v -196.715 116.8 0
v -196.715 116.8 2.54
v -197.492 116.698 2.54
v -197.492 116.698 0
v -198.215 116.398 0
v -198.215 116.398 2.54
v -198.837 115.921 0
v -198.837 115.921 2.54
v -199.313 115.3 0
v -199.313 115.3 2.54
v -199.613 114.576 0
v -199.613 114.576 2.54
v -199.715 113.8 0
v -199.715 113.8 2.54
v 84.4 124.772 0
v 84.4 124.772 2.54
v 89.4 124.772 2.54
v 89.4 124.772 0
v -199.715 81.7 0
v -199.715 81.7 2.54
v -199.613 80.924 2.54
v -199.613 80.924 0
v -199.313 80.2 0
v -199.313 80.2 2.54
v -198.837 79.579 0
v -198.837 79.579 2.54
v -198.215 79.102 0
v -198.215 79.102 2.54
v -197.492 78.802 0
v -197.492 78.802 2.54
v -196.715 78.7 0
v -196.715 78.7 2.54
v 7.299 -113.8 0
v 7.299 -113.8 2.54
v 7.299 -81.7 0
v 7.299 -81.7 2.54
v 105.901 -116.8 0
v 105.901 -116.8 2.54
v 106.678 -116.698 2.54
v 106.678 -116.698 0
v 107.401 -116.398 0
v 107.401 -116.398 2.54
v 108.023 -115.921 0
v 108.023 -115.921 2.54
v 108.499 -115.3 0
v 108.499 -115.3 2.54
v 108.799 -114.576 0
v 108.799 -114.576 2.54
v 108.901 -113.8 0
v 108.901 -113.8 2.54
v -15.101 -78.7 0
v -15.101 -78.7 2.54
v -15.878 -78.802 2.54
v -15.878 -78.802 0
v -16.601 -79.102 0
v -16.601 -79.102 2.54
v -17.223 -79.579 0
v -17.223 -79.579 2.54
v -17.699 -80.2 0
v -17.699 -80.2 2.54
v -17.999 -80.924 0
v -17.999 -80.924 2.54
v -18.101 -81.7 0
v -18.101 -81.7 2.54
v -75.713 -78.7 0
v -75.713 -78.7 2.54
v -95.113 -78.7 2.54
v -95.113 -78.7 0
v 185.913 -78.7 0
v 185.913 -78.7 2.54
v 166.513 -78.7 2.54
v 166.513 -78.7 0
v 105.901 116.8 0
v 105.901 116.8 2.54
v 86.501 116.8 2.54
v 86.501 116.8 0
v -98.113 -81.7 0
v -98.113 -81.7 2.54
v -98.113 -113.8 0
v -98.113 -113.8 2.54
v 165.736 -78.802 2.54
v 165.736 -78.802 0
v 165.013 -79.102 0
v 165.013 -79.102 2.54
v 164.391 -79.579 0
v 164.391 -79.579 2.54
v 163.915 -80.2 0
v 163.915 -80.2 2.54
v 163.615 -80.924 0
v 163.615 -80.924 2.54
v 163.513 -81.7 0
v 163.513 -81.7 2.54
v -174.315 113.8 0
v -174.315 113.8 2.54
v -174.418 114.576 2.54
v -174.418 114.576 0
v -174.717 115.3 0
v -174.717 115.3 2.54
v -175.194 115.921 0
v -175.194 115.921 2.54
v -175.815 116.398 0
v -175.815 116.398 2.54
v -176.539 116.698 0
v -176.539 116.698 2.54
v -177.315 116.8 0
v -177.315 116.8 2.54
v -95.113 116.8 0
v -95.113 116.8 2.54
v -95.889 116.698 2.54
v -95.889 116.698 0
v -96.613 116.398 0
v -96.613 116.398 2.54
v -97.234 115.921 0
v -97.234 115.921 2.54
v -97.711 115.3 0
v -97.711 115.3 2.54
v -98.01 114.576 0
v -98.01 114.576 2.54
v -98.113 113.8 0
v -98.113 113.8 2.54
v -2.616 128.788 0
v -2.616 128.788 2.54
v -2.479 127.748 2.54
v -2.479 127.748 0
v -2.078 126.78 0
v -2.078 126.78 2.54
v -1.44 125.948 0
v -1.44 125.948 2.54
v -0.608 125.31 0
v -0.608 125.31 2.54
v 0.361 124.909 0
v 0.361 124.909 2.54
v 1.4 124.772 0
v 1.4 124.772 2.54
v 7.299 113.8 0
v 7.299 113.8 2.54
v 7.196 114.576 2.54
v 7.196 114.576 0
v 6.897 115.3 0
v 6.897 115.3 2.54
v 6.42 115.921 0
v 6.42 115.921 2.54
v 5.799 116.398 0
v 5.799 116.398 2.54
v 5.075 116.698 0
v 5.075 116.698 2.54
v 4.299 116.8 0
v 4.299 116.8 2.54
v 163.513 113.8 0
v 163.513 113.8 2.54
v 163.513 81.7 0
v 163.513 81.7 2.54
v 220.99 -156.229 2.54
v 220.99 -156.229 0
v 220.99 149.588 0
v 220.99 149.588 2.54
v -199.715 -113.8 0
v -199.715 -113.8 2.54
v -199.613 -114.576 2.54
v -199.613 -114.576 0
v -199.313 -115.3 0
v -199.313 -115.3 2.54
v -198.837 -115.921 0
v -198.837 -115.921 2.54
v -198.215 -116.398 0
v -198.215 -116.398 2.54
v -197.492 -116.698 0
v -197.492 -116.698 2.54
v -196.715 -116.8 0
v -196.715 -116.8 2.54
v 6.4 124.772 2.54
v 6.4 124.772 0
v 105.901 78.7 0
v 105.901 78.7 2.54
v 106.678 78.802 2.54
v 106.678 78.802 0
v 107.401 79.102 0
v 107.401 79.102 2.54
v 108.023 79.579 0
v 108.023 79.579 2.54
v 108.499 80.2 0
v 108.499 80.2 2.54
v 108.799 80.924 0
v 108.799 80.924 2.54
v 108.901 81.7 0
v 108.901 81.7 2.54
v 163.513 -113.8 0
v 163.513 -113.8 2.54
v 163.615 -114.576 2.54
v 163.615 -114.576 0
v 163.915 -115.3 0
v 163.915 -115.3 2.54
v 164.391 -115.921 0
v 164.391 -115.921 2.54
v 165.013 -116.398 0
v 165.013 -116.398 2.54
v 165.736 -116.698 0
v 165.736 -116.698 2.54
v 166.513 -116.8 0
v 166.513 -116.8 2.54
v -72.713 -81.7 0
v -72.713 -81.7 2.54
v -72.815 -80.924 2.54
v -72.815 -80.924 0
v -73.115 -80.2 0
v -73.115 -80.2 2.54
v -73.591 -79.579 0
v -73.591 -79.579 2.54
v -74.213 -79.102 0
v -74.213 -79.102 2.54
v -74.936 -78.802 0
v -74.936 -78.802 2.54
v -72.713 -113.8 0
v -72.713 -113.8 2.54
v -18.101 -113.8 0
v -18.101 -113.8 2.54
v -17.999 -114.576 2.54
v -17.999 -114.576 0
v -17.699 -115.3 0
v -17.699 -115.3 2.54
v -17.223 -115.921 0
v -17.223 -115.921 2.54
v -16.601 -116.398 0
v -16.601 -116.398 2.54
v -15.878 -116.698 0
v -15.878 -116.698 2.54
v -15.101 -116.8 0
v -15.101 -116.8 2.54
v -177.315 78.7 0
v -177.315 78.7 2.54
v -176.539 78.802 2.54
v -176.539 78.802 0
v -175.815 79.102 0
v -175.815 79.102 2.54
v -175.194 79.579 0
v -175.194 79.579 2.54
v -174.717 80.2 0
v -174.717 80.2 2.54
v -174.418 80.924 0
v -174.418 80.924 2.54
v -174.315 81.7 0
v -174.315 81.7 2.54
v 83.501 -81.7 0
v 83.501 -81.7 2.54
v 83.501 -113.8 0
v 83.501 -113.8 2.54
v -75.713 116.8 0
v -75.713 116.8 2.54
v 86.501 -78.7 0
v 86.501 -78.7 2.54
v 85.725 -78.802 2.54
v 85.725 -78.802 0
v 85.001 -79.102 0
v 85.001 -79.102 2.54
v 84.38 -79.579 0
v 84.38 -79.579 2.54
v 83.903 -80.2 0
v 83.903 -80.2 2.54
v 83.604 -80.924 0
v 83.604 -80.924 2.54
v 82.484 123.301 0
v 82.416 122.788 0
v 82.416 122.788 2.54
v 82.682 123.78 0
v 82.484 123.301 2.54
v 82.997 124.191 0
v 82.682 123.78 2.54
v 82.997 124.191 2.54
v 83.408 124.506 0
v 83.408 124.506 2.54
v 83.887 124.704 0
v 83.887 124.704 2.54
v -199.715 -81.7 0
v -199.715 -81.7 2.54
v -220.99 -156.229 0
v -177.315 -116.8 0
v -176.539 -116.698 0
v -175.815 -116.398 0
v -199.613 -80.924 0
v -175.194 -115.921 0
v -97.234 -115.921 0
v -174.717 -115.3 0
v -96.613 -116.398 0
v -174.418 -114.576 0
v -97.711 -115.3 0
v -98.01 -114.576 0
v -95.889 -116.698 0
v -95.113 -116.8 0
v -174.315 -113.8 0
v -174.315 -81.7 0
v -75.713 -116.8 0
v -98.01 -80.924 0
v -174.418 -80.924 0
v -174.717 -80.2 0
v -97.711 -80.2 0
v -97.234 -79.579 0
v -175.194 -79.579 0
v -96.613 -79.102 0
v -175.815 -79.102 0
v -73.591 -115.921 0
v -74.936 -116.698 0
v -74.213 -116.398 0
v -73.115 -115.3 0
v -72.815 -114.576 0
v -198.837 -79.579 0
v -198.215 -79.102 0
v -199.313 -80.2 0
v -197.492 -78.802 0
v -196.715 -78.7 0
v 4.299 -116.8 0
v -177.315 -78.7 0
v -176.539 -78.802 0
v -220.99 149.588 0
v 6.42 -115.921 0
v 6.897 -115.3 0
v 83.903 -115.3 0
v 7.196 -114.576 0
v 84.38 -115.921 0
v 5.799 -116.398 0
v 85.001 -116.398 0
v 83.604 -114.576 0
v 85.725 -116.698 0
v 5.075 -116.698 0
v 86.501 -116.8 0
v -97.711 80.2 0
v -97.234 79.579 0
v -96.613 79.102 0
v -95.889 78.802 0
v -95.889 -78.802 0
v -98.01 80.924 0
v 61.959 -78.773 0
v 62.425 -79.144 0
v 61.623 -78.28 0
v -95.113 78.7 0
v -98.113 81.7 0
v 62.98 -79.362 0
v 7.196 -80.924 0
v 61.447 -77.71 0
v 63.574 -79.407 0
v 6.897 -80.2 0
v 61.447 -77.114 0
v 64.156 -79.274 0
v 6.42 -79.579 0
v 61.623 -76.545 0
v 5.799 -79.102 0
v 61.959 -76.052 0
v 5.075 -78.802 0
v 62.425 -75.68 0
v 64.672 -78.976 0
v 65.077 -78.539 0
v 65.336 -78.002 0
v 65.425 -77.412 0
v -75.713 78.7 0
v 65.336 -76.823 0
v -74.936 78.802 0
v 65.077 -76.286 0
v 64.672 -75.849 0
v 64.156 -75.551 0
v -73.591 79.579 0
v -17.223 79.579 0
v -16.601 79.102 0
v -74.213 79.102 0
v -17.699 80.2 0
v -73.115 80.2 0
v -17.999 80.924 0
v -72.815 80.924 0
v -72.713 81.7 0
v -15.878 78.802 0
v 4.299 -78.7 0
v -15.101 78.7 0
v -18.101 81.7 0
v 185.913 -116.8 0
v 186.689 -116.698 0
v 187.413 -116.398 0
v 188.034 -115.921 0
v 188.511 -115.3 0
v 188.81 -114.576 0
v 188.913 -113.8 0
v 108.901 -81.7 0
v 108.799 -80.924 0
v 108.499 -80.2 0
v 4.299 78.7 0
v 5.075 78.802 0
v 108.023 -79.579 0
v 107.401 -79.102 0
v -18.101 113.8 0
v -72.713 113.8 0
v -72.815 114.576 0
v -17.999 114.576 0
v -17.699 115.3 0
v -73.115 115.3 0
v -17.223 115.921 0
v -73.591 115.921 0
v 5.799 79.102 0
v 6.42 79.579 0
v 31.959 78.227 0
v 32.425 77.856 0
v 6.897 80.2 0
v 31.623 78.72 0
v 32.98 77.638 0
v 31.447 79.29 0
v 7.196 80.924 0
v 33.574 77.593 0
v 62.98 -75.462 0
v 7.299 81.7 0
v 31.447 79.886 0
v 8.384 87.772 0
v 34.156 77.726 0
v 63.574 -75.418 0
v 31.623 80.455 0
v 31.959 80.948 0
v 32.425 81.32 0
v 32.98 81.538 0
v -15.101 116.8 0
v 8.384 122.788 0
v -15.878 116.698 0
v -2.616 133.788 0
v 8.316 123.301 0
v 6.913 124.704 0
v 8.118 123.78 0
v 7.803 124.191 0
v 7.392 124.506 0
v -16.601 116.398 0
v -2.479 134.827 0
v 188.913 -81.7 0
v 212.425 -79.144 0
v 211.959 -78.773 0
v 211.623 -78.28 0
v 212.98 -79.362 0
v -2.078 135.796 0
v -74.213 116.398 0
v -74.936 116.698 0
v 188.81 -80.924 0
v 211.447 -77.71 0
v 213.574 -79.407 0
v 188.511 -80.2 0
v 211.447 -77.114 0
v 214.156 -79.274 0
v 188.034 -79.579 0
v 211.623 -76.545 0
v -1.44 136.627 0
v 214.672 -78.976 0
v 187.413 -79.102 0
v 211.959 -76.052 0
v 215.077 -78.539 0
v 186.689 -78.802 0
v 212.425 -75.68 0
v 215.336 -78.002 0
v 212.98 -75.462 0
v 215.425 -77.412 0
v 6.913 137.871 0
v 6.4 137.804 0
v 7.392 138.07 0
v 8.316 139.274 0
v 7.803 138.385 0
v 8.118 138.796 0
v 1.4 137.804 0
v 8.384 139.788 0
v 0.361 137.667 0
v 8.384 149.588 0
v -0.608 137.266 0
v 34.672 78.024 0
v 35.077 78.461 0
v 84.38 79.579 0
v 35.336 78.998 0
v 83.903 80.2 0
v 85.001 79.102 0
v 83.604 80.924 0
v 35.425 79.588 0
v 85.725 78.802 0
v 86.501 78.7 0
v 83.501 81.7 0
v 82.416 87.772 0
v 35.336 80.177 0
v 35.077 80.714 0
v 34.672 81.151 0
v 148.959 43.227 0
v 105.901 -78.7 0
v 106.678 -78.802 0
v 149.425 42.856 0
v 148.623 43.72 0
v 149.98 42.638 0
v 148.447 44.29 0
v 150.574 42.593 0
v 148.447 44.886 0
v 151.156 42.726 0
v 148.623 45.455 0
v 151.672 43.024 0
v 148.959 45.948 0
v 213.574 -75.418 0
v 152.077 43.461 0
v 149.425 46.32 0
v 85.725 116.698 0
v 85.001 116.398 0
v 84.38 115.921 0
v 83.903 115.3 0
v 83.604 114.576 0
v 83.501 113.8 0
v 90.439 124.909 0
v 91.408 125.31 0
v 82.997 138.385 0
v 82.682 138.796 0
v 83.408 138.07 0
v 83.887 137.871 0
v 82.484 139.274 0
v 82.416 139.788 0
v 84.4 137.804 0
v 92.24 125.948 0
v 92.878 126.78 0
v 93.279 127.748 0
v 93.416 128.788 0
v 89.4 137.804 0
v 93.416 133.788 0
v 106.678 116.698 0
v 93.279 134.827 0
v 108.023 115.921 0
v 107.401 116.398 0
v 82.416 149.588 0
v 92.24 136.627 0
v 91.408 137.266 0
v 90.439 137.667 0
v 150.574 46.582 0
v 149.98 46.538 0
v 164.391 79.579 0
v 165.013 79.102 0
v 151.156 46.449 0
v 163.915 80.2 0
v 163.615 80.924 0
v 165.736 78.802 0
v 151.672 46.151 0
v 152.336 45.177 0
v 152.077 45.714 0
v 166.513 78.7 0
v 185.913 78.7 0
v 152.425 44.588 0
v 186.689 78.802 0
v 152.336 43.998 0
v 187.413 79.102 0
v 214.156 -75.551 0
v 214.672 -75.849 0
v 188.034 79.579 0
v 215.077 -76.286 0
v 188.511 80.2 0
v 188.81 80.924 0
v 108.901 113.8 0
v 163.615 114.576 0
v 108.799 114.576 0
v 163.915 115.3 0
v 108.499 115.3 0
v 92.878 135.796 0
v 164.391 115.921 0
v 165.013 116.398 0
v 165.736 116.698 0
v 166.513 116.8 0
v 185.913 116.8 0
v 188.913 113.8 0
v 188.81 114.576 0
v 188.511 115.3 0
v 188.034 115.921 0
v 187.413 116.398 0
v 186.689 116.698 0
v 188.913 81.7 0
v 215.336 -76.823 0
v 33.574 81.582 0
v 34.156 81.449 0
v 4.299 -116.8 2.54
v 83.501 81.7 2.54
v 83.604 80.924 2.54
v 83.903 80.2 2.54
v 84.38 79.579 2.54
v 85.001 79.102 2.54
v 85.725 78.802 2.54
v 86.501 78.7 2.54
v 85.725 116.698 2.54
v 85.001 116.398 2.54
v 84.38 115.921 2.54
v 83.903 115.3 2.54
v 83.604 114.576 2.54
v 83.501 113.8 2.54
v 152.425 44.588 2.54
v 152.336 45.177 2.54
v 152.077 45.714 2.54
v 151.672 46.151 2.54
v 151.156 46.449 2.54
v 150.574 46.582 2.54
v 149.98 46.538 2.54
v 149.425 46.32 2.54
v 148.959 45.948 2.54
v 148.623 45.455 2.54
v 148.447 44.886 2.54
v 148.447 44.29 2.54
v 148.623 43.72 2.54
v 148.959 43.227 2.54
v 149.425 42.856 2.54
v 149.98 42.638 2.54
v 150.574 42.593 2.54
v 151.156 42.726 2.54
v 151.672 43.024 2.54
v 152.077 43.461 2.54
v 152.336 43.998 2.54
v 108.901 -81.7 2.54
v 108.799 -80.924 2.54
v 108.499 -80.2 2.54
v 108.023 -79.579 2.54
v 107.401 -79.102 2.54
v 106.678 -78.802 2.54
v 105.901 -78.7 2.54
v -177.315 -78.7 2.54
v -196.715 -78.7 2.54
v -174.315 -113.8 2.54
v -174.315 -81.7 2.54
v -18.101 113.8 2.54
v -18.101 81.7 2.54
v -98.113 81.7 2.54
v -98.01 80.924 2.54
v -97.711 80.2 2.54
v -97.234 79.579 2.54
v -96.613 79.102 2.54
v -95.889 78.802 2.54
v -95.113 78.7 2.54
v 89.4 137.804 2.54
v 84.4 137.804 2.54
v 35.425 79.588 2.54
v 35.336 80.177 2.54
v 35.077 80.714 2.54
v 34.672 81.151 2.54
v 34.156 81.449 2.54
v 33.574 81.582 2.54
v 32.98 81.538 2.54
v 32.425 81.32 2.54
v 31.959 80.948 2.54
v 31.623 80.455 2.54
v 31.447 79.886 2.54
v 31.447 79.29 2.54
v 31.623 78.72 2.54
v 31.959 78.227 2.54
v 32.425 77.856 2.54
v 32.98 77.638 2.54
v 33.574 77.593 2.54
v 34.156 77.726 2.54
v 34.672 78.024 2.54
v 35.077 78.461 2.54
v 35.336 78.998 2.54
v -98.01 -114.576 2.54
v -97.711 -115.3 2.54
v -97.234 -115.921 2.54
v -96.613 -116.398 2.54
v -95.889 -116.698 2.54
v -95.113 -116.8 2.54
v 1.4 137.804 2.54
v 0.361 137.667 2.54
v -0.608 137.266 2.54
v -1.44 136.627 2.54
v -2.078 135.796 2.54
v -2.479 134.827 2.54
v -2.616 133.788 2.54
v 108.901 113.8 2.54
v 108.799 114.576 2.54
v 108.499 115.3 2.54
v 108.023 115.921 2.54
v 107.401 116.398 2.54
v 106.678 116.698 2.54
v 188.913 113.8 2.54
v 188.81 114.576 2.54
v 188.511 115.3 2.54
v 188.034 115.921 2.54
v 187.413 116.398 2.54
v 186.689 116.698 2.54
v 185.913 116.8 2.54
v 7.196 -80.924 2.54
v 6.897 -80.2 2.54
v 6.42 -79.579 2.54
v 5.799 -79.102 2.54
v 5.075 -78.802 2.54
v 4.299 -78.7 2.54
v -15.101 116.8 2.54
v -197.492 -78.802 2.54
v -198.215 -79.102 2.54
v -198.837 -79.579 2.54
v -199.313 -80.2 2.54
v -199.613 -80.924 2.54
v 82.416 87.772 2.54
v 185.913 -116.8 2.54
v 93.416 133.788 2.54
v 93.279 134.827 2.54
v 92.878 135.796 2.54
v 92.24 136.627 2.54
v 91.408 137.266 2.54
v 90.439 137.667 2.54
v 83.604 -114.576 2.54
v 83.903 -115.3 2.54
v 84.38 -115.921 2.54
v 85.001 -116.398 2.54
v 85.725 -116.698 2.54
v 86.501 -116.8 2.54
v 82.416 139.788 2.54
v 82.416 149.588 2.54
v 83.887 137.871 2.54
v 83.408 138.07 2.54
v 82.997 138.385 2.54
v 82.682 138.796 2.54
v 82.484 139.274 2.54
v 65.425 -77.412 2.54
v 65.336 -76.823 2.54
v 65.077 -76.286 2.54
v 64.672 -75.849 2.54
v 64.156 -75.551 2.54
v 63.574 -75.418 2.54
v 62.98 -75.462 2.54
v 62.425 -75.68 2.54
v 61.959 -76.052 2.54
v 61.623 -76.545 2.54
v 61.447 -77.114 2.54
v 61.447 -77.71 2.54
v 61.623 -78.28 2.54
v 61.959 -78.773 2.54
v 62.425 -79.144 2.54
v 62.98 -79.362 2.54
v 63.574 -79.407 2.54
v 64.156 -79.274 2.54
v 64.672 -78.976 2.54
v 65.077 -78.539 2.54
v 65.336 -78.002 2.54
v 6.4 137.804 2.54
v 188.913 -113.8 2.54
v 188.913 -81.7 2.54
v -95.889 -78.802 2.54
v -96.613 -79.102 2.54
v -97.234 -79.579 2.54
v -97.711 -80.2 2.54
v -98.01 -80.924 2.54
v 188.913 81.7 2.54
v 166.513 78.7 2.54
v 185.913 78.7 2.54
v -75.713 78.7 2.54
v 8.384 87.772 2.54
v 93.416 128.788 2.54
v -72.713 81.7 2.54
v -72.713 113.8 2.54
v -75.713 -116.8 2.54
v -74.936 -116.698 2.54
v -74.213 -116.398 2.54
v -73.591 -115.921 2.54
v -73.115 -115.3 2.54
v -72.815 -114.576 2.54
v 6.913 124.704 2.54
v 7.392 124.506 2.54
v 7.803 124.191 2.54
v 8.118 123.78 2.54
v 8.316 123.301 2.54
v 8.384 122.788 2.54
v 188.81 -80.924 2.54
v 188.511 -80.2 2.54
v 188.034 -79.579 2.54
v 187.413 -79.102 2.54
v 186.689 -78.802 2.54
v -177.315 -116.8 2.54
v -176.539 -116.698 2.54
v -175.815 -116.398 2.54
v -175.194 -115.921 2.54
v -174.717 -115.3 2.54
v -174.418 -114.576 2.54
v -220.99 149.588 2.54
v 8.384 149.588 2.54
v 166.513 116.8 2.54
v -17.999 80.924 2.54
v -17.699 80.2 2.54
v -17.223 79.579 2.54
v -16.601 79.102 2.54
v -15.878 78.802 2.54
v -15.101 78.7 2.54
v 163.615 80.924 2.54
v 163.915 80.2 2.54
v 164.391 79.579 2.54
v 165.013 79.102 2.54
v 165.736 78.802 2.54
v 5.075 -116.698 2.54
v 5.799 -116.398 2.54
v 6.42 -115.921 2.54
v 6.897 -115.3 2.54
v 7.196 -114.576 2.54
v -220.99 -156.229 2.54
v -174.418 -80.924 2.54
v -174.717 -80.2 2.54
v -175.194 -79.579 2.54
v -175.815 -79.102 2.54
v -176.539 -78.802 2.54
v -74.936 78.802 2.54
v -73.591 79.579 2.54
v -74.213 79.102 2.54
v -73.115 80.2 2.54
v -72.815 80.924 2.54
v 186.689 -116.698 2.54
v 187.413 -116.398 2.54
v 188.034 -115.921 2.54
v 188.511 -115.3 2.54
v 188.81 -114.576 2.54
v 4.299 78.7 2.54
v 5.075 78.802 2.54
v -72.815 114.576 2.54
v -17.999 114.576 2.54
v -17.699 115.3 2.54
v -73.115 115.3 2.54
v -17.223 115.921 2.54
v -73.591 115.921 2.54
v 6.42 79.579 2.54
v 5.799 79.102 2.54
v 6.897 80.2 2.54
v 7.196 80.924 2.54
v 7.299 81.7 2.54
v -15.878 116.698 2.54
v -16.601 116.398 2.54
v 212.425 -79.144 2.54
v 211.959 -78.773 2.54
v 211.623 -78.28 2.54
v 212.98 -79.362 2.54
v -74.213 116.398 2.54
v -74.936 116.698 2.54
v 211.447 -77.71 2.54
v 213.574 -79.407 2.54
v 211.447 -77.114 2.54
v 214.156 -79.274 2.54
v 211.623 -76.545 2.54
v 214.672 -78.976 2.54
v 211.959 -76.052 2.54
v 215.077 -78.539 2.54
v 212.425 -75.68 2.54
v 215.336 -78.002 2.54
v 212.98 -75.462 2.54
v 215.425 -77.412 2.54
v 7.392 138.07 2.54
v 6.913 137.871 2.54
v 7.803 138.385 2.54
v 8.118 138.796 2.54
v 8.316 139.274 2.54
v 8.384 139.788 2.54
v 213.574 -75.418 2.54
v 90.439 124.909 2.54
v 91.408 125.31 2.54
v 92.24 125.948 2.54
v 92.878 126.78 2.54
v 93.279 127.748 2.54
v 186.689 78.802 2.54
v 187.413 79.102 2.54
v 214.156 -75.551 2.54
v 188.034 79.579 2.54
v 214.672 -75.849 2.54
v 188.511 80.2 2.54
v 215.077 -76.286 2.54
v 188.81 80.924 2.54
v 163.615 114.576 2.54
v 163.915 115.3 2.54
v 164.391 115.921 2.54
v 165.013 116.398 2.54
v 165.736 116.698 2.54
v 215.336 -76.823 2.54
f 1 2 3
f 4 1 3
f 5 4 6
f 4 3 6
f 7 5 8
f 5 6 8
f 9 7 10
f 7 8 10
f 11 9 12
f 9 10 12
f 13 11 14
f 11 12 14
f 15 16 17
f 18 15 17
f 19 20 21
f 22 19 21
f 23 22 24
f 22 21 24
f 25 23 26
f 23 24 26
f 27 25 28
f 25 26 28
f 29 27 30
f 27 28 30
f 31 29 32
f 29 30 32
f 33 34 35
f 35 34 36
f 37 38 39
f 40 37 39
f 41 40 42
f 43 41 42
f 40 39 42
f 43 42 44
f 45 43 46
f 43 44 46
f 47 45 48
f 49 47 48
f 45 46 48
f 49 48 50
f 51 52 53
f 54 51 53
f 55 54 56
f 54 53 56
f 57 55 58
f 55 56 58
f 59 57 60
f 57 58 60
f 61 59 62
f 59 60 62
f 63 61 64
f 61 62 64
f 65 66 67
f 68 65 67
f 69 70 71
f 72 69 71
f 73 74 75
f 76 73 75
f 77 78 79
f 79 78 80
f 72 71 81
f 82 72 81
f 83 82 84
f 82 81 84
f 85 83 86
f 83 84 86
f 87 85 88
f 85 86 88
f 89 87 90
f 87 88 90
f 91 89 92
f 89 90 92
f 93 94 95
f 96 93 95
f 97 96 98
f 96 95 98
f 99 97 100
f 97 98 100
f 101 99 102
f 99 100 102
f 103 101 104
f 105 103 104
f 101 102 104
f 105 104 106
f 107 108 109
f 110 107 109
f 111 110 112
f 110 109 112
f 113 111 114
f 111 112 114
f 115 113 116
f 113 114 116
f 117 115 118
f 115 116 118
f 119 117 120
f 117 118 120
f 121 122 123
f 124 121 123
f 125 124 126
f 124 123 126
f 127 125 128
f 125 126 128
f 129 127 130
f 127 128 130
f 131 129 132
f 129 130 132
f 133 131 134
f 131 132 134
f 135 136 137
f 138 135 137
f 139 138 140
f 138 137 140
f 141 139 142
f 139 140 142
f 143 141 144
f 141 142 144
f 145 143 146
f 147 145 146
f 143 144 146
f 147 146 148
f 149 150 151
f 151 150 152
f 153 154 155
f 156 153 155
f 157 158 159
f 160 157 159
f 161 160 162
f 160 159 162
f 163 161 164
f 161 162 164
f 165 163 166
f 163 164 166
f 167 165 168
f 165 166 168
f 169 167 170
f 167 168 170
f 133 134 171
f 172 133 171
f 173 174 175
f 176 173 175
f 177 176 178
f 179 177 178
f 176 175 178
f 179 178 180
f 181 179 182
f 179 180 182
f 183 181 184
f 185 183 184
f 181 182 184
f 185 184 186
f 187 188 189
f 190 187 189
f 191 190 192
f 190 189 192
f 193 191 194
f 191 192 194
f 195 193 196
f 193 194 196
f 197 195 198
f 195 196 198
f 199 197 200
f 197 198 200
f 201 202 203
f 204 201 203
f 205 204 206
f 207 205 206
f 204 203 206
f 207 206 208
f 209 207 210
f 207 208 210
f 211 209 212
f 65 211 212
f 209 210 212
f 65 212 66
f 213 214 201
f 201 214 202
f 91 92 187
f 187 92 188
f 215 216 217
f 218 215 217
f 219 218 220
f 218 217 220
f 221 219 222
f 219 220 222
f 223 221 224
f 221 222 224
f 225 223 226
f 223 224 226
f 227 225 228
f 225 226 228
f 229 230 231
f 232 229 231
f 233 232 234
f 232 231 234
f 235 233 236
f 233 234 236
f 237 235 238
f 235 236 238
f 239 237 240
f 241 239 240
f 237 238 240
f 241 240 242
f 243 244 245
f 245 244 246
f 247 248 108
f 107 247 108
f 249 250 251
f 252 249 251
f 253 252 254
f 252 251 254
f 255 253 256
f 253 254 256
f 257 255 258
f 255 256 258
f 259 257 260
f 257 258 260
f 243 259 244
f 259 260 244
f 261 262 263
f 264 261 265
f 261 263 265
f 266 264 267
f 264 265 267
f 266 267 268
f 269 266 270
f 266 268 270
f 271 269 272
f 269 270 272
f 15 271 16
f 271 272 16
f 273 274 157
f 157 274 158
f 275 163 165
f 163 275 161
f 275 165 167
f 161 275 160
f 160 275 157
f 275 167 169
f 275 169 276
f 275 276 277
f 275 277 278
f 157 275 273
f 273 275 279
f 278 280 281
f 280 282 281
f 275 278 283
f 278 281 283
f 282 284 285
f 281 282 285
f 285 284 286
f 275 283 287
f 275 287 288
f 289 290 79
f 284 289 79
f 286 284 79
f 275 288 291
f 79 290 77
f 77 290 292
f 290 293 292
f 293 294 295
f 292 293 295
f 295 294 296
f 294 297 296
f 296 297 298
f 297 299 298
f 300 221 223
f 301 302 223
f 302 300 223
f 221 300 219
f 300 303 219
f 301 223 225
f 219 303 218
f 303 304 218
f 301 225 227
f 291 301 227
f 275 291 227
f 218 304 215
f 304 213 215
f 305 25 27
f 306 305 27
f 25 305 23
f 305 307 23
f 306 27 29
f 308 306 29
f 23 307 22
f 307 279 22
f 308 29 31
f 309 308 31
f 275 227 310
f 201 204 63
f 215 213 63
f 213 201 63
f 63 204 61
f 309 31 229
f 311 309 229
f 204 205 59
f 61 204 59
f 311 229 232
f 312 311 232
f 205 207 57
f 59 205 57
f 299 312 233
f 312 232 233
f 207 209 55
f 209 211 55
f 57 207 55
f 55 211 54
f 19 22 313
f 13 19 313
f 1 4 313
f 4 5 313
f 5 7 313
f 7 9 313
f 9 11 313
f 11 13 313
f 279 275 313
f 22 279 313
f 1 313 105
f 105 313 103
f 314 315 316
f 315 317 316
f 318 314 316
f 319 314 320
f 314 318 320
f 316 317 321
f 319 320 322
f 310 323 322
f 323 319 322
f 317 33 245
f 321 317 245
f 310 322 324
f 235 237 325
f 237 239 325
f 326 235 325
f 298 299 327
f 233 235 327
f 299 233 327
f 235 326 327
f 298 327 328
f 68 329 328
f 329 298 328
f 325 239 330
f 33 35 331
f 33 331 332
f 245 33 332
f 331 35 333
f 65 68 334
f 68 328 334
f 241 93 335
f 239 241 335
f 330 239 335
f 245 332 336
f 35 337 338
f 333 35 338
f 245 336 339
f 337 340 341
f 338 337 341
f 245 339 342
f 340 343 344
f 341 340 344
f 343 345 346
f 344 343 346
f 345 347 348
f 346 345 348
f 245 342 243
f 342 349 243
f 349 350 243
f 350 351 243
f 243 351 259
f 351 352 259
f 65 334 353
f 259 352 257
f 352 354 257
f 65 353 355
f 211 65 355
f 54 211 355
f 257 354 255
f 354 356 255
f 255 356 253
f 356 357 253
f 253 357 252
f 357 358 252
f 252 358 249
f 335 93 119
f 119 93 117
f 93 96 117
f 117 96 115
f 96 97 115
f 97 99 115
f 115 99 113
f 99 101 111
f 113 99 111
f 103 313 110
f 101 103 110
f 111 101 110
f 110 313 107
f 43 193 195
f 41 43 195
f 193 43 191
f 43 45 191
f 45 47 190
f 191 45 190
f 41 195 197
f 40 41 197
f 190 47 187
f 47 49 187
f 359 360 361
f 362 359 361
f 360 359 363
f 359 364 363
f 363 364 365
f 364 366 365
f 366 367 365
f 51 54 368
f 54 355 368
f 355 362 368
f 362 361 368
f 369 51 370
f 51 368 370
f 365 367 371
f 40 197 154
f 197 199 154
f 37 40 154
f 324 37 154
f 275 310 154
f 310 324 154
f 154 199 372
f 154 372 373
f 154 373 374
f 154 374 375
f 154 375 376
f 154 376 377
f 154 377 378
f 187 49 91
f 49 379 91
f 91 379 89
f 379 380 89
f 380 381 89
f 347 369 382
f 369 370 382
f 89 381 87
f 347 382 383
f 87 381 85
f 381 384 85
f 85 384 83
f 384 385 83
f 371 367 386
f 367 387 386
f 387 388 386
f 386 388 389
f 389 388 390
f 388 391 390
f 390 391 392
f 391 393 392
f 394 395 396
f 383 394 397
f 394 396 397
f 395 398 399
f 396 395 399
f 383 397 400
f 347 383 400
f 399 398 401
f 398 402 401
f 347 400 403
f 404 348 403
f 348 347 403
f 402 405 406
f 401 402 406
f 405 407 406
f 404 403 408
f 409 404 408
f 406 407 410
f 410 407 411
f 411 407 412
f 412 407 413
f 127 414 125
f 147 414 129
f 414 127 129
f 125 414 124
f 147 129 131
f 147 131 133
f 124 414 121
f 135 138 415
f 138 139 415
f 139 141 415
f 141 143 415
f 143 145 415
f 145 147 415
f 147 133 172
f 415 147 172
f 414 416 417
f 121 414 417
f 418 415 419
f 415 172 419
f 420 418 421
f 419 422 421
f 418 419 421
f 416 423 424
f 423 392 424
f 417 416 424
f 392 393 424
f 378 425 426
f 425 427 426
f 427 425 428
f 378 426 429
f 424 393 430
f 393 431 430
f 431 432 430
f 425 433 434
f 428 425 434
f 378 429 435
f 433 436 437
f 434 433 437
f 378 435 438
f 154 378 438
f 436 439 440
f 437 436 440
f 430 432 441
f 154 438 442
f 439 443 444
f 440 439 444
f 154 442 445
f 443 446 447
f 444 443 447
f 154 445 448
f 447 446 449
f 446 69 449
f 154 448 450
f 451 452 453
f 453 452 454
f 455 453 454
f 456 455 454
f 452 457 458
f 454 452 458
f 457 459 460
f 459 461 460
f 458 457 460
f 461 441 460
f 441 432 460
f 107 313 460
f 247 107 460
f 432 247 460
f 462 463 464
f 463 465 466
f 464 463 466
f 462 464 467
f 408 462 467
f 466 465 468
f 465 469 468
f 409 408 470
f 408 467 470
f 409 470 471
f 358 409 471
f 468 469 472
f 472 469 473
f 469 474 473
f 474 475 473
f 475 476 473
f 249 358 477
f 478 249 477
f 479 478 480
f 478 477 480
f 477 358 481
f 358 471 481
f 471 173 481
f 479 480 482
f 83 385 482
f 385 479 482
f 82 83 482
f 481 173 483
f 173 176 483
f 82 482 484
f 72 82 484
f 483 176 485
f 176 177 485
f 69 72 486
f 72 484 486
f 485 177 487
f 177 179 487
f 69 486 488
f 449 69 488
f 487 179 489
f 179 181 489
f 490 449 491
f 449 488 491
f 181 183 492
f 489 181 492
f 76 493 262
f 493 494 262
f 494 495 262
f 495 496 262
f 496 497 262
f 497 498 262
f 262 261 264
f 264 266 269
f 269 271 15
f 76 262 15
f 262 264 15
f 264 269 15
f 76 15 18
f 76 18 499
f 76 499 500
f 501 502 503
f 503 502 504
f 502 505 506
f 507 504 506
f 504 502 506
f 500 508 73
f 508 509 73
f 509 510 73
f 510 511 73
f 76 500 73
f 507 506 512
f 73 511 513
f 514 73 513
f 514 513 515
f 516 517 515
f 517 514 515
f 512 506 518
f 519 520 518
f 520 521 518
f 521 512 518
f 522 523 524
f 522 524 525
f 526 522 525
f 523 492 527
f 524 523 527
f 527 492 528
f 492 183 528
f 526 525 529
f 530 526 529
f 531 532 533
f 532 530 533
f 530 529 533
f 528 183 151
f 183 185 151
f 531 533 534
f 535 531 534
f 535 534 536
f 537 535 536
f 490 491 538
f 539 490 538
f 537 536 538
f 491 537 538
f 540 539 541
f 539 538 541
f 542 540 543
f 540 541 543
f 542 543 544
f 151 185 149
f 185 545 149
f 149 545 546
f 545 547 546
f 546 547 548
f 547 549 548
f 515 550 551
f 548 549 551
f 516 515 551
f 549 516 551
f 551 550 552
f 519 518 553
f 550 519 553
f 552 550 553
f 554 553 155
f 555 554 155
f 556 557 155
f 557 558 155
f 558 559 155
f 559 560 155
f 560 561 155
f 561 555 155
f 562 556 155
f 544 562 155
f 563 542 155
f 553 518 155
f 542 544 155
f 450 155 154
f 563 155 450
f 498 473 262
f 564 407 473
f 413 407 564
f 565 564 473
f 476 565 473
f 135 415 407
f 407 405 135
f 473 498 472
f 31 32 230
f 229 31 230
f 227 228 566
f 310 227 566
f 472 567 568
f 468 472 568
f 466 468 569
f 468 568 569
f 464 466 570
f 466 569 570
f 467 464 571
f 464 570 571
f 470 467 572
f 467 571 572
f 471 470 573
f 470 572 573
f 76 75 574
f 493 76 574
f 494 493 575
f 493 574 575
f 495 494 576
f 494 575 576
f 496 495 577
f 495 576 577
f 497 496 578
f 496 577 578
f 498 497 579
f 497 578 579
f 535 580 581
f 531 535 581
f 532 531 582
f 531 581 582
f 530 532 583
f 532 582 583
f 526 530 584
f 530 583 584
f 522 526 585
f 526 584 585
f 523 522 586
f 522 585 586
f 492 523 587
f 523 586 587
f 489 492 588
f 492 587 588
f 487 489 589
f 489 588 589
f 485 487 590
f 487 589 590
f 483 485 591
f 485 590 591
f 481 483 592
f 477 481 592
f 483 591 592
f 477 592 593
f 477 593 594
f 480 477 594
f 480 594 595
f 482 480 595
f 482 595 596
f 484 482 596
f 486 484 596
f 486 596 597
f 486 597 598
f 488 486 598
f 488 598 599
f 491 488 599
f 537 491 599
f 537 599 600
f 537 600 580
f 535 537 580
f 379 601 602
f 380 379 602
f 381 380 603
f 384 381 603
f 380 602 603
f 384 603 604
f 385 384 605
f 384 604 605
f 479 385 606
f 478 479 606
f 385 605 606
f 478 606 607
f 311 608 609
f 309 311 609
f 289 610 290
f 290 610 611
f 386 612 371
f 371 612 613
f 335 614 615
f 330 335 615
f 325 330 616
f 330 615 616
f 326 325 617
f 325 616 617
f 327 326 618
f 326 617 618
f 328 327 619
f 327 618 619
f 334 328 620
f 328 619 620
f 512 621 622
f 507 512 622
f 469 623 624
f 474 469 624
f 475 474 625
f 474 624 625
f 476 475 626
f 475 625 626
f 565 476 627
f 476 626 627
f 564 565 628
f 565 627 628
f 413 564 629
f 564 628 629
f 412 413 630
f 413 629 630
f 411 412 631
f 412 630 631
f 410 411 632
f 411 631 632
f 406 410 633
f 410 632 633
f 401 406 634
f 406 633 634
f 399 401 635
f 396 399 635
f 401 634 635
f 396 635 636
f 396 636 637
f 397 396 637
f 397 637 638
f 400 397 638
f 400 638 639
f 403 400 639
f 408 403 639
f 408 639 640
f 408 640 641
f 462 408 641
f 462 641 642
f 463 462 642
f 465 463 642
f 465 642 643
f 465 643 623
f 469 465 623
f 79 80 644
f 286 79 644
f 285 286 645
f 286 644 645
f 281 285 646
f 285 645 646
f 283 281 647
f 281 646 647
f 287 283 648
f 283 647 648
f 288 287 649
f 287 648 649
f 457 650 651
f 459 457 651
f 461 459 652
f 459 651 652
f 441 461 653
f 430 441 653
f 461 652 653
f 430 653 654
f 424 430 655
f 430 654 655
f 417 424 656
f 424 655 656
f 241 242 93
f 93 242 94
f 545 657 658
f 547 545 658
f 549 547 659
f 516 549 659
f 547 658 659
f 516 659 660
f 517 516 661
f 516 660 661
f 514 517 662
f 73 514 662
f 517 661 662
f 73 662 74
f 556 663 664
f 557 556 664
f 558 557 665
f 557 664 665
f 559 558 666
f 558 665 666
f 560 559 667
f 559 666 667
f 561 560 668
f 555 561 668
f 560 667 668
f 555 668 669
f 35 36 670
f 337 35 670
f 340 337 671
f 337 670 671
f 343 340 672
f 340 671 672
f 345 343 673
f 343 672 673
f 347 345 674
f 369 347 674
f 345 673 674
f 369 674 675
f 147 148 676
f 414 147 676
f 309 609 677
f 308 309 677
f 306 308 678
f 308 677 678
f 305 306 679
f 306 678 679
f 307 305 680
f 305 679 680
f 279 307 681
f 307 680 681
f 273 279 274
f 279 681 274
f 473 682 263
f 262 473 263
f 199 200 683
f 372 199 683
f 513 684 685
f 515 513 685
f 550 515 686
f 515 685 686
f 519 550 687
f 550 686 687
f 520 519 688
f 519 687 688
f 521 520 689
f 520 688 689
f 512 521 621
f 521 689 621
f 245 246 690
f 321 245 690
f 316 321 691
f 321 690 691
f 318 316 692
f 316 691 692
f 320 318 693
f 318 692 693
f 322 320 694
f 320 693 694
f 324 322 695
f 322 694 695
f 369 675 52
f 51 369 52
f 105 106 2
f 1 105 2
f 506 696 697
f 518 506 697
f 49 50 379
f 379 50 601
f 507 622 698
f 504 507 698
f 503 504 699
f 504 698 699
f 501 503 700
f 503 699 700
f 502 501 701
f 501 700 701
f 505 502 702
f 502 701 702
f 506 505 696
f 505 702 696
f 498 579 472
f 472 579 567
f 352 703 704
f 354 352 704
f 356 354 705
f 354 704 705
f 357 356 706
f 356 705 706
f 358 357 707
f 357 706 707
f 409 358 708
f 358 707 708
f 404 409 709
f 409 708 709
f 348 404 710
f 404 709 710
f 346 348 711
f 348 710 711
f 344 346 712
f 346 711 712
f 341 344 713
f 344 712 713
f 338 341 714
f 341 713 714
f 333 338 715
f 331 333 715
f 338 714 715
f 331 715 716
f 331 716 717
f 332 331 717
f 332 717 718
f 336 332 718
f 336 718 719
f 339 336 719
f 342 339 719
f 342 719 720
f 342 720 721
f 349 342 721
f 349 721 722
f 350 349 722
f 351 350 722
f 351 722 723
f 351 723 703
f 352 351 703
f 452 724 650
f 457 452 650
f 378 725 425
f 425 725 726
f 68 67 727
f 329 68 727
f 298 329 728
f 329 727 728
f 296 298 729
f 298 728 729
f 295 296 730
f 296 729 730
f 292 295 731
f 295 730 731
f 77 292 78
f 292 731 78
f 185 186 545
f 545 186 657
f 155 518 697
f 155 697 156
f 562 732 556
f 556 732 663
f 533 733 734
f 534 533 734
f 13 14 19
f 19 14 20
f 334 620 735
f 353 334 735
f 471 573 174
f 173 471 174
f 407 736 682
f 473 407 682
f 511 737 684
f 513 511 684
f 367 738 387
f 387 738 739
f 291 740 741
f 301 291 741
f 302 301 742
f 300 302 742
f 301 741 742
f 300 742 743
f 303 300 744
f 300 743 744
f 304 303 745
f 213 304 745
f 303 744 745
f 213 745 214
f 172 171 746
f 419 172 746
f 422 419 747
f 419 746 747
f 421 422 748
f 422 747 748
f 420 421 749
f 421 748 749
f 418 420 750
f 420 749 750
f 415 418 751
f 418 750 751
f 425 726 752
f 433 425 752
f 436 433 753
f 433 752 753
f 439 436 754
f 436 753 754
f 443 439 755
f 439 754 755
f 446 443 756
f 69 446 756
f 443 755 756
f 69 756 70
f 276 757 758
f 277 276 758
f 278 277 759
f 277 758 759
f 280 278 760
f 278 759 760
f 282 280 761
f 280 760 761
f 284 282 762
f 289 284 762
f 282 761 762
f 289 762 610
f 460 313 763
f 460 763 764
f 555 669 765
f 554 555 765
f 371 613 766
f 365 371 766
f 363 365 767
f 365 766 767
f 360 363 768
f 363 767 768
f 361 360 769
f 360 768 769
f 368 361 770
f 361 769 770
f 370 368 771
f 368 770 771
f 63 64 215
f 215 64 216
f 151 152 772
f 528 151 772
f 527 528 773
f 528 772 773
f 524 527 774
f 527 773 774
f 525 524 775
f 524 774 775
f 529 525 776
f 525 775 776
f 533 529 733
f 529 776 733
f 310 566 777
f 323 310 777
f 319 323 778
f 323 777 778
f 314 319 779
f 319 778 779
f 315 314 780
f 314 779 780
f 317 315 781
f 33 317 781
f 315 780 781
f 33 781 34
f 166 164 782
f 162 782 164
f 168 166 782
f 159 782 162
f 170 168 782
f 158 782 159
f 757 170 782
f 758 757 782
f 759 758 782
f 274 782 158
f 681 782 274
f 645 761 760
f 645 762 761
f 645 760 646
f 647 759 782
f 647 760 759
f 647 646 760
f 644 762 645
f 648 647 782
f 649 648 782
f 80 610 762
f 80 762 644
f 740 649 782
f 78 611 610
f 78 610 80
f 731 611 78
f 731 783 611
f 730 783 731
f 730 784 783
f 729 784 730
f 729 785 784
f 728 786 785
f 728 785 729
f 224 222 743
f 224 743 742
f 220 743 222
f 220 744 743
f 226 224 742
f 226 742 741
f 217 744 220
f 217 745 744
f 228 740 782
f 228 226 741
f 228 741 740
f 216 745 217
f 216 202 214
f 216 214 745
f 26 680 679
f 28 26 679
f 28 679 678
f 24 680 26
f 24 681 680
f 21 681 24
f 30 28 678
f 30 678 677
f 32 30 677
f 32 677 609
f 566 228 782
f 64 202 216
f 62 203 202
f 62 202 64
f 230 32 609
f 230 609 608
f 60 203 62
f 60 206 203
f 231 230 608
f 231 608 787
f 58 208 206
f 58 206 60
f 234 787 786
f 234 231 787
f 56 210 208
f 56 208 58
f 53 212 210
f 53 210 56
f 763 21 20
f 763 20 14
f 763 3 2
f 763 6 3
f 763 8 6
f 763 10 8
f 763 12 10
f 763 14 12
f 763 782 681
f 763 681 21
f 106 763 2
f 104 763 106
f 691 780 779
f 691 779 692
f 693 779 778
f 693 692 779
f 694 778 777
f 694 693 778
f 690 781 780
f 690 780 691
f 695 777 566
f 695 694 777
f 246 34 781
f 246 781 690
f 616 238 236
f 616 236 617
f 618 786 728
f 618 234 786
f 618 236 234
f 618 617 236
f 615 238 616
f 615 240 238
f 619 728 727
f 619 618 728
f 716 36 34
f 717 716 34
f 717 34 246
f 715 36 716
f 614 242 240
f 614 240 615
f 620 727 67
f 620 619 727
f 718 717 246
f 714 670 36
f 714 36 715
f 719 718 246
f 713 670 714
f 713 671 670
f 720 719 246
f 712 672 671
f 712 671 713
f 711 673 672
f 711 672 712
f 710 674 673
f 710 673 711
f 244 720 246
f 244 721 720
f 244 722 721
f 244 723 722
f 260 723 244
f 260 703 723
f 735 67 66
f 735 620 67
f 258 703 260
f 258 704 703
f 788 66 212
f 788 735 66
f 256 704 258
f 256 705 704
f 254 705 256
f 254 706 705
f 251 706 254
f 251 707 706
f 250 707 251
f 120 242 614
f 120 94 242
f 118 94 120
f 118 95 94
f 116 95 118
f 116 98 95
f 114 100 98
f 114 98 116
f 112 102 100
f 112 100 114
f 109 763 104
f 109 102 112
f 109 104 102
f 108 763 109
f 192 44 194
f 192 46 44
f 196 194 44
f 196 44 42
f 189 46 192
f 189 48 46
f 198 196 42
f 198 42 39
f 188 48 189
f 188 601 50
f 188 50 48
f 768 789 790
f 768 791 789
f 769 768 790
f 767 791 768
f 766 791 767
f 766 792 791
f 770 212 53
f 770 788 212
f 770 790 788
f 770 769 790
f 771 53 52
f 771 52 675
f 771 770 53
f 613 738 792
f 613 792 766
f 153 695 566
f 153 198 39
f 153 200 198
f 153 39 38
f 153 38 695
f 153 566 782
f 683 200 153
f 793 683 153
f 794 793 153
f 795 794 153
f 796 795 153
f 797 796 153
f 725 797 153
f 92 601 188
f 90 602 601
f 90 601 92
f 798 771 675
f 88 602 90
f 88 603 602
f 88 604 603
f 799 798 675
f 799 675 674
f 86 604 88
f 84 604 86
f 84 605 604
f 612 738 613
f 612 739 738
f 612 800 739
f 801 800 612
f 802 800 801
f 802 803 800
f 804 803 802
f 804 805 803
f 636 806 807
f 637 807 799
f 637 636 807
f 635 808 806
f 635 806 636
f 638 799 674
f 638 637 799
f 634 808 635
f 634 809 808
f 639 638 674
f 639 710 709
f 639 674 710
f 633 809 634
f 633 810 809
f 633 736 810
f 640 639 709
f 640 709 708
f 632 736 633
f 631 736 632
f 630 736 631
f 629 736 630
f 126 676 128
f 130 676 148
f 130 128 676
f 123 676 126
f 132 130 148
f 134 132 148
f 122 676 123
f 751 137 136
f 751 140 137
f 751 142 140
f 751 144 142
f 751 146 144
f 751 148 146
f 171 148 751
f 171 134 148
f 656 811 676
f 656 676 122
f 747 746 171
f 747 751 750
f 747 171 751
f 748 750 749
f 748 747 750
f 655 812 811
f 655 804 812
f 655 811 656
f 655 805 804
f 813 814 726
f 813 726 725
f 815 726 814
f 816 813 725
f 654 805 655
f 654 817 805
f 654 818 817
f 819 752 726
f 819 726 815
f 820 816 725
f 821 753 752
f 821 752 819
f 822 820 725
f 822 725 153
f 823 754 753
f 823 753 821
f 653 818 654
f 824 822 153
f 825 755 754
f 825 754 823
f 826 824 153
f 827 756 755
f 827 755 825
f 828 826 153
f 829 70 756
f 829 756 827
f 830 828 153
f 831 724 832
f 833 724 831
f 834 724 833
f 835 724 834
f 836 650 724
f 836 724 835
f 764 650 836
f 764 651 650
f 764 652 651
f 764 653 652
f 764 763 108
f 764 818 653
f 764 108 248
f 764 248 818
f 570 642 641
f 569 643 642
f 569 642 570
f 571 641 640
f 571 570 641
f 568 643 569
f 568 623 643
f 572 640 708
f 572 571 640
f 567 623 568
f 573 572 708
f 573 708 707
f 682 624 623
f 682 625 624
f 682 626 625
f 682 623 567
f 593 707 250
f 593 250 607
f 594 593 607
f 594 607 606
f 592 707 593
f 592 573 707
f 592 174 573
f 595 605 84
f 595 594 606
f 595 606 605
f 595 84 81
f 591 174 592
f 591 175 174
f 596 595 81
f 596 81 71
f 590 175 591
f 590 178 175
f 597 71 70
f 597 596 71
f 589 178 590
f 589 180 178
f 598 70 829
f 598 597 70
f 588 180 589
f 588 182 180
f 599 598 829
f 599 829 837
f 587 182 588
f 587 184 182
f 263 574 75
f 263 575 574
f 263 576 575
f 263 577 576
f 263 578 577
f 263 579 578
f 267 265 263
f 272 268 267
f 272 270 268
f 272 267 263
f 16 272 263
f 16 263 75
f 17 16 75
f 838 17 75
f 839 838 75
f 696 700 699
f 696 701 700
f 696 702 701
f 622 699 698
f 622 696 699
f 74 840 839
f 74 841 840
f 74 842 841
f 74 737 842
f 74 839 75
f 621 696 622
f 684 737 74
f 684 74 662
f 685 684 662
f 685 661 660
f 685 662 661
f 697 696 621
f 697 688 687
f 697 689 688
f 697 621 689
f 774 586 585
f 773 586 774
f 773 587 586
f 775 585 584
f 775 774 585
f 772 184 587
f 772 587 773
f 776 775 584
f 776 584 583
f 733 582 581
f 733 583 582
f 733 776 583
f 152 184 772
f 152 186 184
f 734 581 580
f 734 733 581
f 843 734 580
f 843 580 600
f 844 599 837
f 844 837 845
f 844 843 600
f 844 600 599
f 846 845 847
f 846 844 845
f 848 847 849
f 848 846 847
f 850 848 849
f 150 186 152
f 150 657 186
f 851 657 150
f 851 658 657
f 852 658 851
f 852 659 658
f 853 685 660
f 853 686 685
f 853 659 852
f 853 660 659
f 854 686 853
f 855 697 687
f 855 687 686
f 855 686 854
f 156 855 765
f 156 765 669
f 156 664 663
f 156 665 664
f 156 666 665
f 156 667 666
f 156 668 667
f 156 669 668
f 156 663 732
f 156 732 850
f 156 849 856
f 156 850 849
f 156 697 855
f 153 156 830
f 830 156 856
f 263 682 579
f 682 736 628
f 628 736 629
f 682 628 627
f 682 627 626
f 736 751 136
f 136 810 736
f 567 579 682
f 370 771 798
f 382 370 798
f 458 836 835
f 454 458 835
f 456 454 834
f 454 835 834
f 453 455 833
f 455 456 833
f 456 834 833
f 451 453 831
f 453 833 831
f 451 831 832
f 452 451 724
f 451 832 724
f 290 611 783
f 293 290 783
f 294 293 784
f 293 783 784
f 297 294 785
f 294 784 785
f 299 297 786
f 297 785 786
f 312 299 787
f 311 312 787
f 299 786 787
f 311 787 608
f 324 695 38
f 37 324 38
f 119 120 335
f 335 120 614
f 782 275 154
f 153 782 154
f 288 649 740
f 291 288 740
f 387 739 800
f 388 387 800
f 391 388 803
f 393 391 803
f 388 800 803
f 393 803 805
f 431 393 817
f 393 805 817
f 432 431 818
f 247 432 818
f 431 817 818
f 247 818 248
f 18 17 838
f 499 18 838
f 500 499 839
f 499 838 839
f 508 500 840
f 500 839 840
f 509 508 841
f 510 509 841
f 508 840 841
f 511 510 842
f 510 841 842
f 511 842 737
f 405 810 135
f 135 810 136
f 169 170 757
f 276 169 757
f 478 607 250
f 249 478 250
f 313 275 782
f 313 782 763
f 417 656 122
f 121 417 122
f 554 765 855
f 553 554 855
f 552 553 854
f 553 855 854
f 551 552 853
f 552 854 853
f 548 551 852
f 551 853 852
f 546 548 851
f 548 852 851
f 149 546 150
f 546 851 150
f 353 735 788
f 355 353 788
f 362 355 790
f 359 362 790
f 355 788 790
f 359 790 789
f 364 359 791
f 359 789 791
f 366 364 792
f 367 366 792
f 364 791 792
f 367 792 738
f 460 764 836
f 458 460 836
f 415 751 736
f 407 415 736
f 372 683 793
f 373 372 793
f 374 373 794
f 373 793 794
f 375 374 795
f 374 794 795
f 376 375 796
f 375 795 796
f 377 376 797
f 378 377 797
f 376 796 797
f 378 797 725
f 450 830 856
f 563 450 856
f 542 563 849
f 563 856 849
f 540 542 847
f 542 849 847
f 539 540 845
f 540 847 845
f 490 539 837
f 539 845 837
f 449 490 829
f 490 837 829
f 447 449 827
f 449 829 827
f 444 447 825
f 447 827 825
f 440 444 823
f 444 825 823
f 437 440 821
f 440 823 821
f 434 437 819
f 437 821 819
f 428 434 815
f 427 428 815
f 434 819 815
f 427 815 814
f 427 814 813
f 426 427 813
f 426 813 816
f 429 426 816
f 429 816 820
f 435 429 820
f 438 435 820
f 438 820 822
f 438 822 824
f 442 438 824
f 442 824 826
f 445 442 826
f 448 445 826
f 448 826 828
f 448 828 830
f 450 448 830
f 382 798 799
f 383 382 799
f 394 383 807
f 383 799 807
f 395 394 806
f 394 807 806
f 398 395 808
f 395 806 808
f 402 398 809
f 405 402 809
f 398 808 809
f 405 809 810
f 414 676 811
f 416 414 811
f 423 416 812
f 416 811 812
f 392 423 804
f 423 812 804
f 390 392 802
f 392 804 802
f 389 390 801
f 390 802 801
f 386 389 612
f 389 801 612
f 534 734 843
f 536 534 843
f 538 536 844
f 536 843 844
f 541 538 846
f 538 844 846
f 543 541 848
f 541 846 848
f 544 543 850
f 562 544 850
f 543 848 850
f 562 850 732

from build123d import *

# Parameters (mm, degrees)
SKETCH1_W           = 441.979400076
SKETCH1_H           = 305.81676
BOSS_EXTRUDE1_DEPTH = 2.54
CUT_EXTRUDE1_DEPTH  = 271.648139079
LPATTERN1_COUNT     = 3
LPATTERN1_PITCH     = 181.613999992
CUT_EXTRUDE2_DEPTH  = 271.648139079
LPATTERN2_COUNT     = 2
LPATTERN2_PITCH     = 181.613999992
CUT_EXTRUDE3_DEPTH  = 271.648139079
SKETCH6_R           = 2
CUT_EXTRUDE4_DEPTH  = 271.648139079


with BuildPart() as part:
    # Sketch1 → Boss-Extrude1 (new body)
    # profile 1 of 5: a face of its own
    with BuildSketch(Plane.XY):
        with Locations((0, -3.32067)):
            Rectangle(SKETCH1_W, SKETCH1_H)
        with BuildLine():
            ThreePointArc((-98.112625, -113.8), (-97.233945344, -115.921320344), (-95.112625, -116.8))
            Line((-95.112625, -116.8), (-75.712625, -116.8))
            ThreePointArc((-75.712625, -116.8), (-73.591304656, -115.921320344), (-72.712625, -113.8))
            Line((-72.712625, -113.8), (-72.712625, -81.7))
            ThreePointArc((-72.712625, -81.7), (-73.591304656, -79.578679656), (-75.712625, -78.7))
            Line((-75.712625, -78.7), (-95.112625, -78.7))
            ThreePointArc((-95.112625, -78.7), (-97.233945344, -79.578679656), (-98.112625, -81.7))
            Line((-98.112625, -81.7), (-98.112625, -113.8))
        make_face(mode=Mode.SUBTRACT)
        with BuildLine():
            ThreePointArc((-98.112625, 81.7), (-97.233945344, 79.578679656), (-95.112625, 78.7))
            Line((-95.112625, 78.7), (-75.712625, 78.7))
            ThreePointArc((-75.712625, 78.7), (-73.591304656, 79.578679656), (-72.712625, 81.7))
            Line((-72.712625, 81.7), (-72.712625, 113.8))
            ThreePointArc((-72.712625, 113.8), (-73.591304656, 115.921320344), (-75.712625, 116.8))
            Line((-75.712625, 116.8), (-95.112625, 116.8))
            ThreePointArc((-95.112625, 116.8), (-97.233945344, 115.921320344), (-98.112625, 113.8))
            Line((-98.112625, 113.8), (-98.112625, 81.7))
        make_face(mode=Mode.SUBTRACT)
        with BuildLine():
            ThreePointArc((-199.715375, -113.8), (-198.836695344, -115.921320344), (-196.715375, -116.8))
            Line((-196.715375, -116.8), (-177.315375, -116.8))
            ThreePointArc((-177.315375, -116.8), (-175.194054656, -115.921320344), (-174.315375, -113.8))
            Line((-174.315375, -113.8), (-174.315375, -81.7))
            ThreePointArc((-174.315375, -81.7), (-175.194054656, -79.578679656), (-177.315375, -78.7))
            Line((-177.315375, -78.7), (-196.715375, -78.7))
            ThreePointArc((-196.715375, -78.7), (-198.836695344, -79.578679656), (-199.715375, -81.7))
            Line((-199.715375, -81.7), (-199.715375, -113.8))
        make_face(mode=Mode.SUBTRACT)
        with BuildLine():
            ThreePointArc((-199.715375, 81.7), (-198.836695344, 79.578679656), (-196.715375, 78.7))
            Line((-196.715375, 78.7), (-177.315375, 78.7))
            ThreePointArc((-177.315375, 78.7), (-175.194054656, 79.578679656), (-174.315375, 81.7))
            Line((-174.315375, 81.7), (-174.315375, 113.8))
            ThreePointArc((-174.315375, 113.8), (-175.194054656, 115.921320344), (-177.315375, 116.8))
            Line((-177.315375, 116.8), (-196.715375, 116.8))
            ThreePointArc((-196.715375, 116.8), (-198.836695344, 115.921320344), (-199.715375, 113.8))
            Line((-199.715375, 113.8), (-199.715375, 81.7))
        make_face(mode=Mode.SUBTRACT)
    # profile 2 of 5: a face of its own
    with BuildSketch(Plane.XY):
        with BuildLine():
            Line((-199.715375, -113.8), (-199.715375, -81.7))
            ThreePointArc((-199.715375, -81.7), (-198.836695344, -79.578679656), (-196.715375, -78.7))
            Line((-196.715375, -78.7), (-177.315375, -78.7))
            ThreePointArc((-177.315375, -78.7), (-175.194054656, -79.578679656), (-174.315375, -81.7))
            Line((-174.315375, -81.7), (-174.315375, -113.8))
            ThreePointArc((-174.315375, -113.8), (-175.194054656, -115.921320344), (-177.315375, -116.8))
            Line((-177.315375, -116.8), (-196.715375, -116.8))
            ThreePointArc((-196.715375, -116.8), (-198.836695344, -115.921320344), (-199.715375, -113.8))
        make_face()
    # profile 3 of 5: a face of its own
    with BuildSketch(Plane.XY):
        with BuildLine():
            Line((-98.112625, -113.8), (-98.112625, -81.7))
            ThreePointArc((-98.112625, -81.7), (-97.233945344, -79.578679656), (-95.112625, -78.7))
            Line((-95.112625, -78.7), (-75.712625, -78.7))
            ThreePointArc((-75.712625, -78.7), (-73.591304656, -79.578679656), (-72.712625, -81.7))
            Line((-72.712625, -81.7), (-72.712625, -113.8))
            ThreePointArc((-72.712625, -113.8), (-73.591304656, -115.921320344), (-75.712625, -116.8))
            Line((-75.712625, -116.8), (-95.112625, -116.8))
            ThreePointArc((-95.112625, -116.8), (-97.233945344, -115.921320344), (-98.112625, -113.8))
        make_face()
    # profile 4 of 5: a face of its own
    with BuildSketch(Plane.XY):
        with BuildLine():
            Line((-199.715375, 113.8), (-199.715375, 81.7))
            ThreePointArc((-199.715375, 81.7), (-198.836695344, 79.578679656), (-196.715375, 78.7))
            Line((-196.715375, 78.7), (-177.315375, 78.7))
            ThreePointArc((-177.315375, 78.7), (-175.194054656, 79.578679656), (-174.315375, 81.7))
            Line((-174.315375, 81.7), (-174.315375, 113.8))
            ThreePointArc((-174.315375, 113.8), (-175.194054656, 115.921320344), (-177.315375, 116.8))
            Line((-177.315375, 116.8), (-196.715375, 116.8))
            ThreePointArc((-196.715375, 116.8), (-198.836695344, 115.921320344), (-199.715375, 113.8))
        make_face()
    # profile 5 of 5: a face of its own
    with BuildSketch(Plane.XY):
        with BuildLine():
            Line((-98.112625, 113.8), (-98.112625, 81.7))
            ThreePointArc((-98.112625, 81.7), (-97.233945344, 79.578679656), (-95.112625, 78.7))
            Line((-95.112625, 78.7), (-75.712625, 78.7))
            ThreePointArc((-75.712625, 78.7), (-73.591304656, 79.578679656), (-72.712625, 81.7))
            Line((-72.712625, 81.7), (-72.712625, 113.8))
            ThreePointArc((-72.712625, 113.8), (-73.591304656, 115.921320344), (-75.712625, 116.8))
            Line((-75.712625, 116.8), (-95.112625, 116.8))
            ThreePointArc((-95.112625, 116.8), (-97.233945344, 115.921320344), (-98.112625, 113.8))
        make_face()
    extrude(amount=BOSS_EXTRUDE1_DEPTH)

    # Sketch2 → Cut-Extrude1 (cut, through all)
    with BuildSketch(Plane.XY.offset(2.54)):
        with BuildLine():
            Line((-196.715375, 78.7), (-177.315375, 78.7))
            ThreePointArc((-177.315375, 78.7), (-175.194054656, 79.578679656), (-174.315375, 81.7))
            Line((-174.315375, 81.7), (-174.315375, 113.8))
            ThreePointArc((-174.315375, 113.8), (-175.194054656, 115.921320344), (-177.315375, 116.8))
            Line((-177.315375, 116.8), (-196.715375, 116.8))
            ThreePointArc((-196.715375, 116.8), (-198.836695344, 115.921320344), (-199.715375, 113.8))
            Line((-199.715375, 113.8), (-199.715375, 81.7))
            ThreePointArc((-199.715375, 81.7), (-198.836695344, 79.578679656), (-196.715375, 78.7))
        make_face()
        with BuildLine():
            Line((-199.715375, -81.7), (-199.715375, -113.8))
            ThreePointArc((-199.715375, -113.8), (-198.836695344, -115.921320344), (-196.715375, -116.8))
            Line((-196.715375, -116.8), (-177.315375, -116.8))
            ThreePointArc((-177.315375, -116.8), (-175.194054656, -115.921320344), (-174.315375, -113.8))
            Line((-174.315375, -113.8), (-174.315375, -81.7))
            ThreePointArc((-174.315375, -81.7), (-175.194054656, -79.578679656), (-177.315375, -78.7))
            Line((-177.315375, -78.7), (-196.715375, -78.7))
            ThreePointArc((-196.715375, -78.7), (-198.836695344, -79.578679656), (-199.715375, -81.7))
        make_face()
    cut_extrude1 = extrude(amount=-CUT_EXTRUDE1_DEPTH, mode=Mode.SUBTRACT)

    # LPattern1: Cut-Extrude1 ×3
    with Locations(*[(i * LPATTERN1_PITCH, 0, 0) for i in range(1, LPATTERN1_COUNT)]):
        add(cut_extrude1, mode=Mode.SUBTRACT)

    # Sketch3 → Cut-Extrude2 (cut, through all)
    with BuildSketch(Plane.XY.offset(2.54)):
        with BuildLine():
            Line((-72.712625, 81.7), (-72.712625, 113.8))
            ThreePointArc((-72.712625, 113.8), (-73.591304656, 115.921320344), (-75.712625, 116.8))
            Line((-75.712625, 116.8), (-95.112625, 116.8))
            ThreePointArc((-95.112625, 116.8), (-97.233945344, 115.921320344), (-98.112625, 113.8))
            Line((-98.112625, 113.8), (-98.112625, 81.7))
            ThreePointArc((-98.112625, 81.7), (-97.233945344, 79.578679656), (-95.112625, 78.7))
            Line((-95.112625, 78.7), (-75.712625, 78.7))
            ThreePointArc((-75.712625, 78.7), (-73.591304656, 79.578679656), (-72.712625, 81.7))
        make_face()
        with BuildLine():
            Line((-72.712625, -113.8), (-72.712625, -81.7))
            ThreePointArc((-72.712625, -81.7), (-73.591304656, -79.578679656), (-75.712625, -78.7))
            Line((-75.712625, -78.7), (-95.112625, -78.7))
            ThreePointArc((-95.112625, -78.7), (-97.233945344, -79.578679656), (-98.112625, -81.7))
            Line((-98.112625, -81.7), (-98.112625, -113.8))
            ThreePointArc((-98.112625, -113.8), (-97.233945344, -115.921320344), (-95.112625, -116.8))
            Line((-95.112625, -116.8), (-75.712625, -116.8))
            ThreePointArc((-75.712625, -116.8), (-73.591304656, -115.921320344), (-72.712625, -113.8))
        make_face()
    cut_extrude2 = extrude(amount=-CUT_EXTRUDE2_DEPTH, mode=Mode.SUBTRACT)

    # LPattern2: Cut-Extrude2 ×2
    with Locations(*[(i * LPATTERN2_PITCH, 0, 0) for i in range(1, LPATTERN2_COUNT)]):
        add(cut_extrude2, mode=Mode.SUBTRACT)

    # Sketch5 → Cut-Extrude3 (cut, through all)
    with BuildSketch(Plane.XY.offset(2.54)):
        with BuildLine():
            ThreePointArc((8.383999992, 139.78771), (7.802899846, 138.384810146), (6.399999992, 137.80371))
            Line((6.399999992, 137.80371), (1.399999992, 137.80371))
            ThreePointArc((1.399999992, 137.80371), (-1.439740841, 136.627450833), (-2.616000008, 133.78771))
            Line((-2.616000008, 133.78771), (-2.616000008, 128.78771))
            ThreePointArc((-2.616000008, 128.78771), (-1.439740841, 125.947969167), (1.399999992, 124.77171))
            Line((1.399999992, 124.77171), (6.399999992, 124.77171))
            ThreePointArc((6.399999992, 124.77171), (7.802899846, 124.190609854), (8.383999992, 122.78771))
            Line((8.383999992, 122.78771), (8.383999992, 87.77171))
            Line((8.383999992, 87.77171), (82.415999992, 87.77171))
            Line((82.415999992, 87.77171), (82.415999992, 122.78771))
            ThreePointArc((82.415999992, 122.78771), (82.997100138, 124.190609854), (84.399999992, 124.77171))
            Line((84.399999992, 124.77171), (89.399999992, 124.77171))
            ThreePointArc((89.399999992, 124.77171), (92.239740825, 125.947969167), (93.415999992, 128.78771))
            Line((93.415999992, 128.78771), (93.415999992, 133.78771))
            ThreePointArc((93.415999992, 133.78771), (92.239740825, 136.627450833), (89.399999992, 137.80371))
            Line((89.399999992, 137.80371), (84.399999992, 137.80371))
            ThreePointArc((84.399999992, 137.80371), (82.997100138, 138.384810146), (82.415999992, 139.78771))
            Line((82.415999992, 139.78771), (82.415999992, 149.80371))
            Line((82.415999992, 149.80371), (8.383999992, 149.80371))
            Line((8.383999992, 149.80371), (8.383999992, 139.78771))
        make_face()
    extrude(amount=-CUT_EXTRUDE3_DEPTH, mode=Mode.SUBTRACT)

    # Sketch6 → Cut-Extrude4 (cut, through all)
    with BuildSketch(Plane.XY.offset(2.54)):
        with Locations((63.425, -77.41229)):
            Circle(SKETCH6_R)
        with Locations((213.425, -77.41229)):
            Circle(SKETCH6_R)
        with Locations((150.425, 44.58771)):
            Circle(SKETCH6_R)
        with Locations((33.425, 79.58771)):
            Circle(SKETCH6_R)
    extrude(amount=-CUT_EXTRUDE4_DEPTH, mode=Mode.SUBTRACT)


solid = part.part
